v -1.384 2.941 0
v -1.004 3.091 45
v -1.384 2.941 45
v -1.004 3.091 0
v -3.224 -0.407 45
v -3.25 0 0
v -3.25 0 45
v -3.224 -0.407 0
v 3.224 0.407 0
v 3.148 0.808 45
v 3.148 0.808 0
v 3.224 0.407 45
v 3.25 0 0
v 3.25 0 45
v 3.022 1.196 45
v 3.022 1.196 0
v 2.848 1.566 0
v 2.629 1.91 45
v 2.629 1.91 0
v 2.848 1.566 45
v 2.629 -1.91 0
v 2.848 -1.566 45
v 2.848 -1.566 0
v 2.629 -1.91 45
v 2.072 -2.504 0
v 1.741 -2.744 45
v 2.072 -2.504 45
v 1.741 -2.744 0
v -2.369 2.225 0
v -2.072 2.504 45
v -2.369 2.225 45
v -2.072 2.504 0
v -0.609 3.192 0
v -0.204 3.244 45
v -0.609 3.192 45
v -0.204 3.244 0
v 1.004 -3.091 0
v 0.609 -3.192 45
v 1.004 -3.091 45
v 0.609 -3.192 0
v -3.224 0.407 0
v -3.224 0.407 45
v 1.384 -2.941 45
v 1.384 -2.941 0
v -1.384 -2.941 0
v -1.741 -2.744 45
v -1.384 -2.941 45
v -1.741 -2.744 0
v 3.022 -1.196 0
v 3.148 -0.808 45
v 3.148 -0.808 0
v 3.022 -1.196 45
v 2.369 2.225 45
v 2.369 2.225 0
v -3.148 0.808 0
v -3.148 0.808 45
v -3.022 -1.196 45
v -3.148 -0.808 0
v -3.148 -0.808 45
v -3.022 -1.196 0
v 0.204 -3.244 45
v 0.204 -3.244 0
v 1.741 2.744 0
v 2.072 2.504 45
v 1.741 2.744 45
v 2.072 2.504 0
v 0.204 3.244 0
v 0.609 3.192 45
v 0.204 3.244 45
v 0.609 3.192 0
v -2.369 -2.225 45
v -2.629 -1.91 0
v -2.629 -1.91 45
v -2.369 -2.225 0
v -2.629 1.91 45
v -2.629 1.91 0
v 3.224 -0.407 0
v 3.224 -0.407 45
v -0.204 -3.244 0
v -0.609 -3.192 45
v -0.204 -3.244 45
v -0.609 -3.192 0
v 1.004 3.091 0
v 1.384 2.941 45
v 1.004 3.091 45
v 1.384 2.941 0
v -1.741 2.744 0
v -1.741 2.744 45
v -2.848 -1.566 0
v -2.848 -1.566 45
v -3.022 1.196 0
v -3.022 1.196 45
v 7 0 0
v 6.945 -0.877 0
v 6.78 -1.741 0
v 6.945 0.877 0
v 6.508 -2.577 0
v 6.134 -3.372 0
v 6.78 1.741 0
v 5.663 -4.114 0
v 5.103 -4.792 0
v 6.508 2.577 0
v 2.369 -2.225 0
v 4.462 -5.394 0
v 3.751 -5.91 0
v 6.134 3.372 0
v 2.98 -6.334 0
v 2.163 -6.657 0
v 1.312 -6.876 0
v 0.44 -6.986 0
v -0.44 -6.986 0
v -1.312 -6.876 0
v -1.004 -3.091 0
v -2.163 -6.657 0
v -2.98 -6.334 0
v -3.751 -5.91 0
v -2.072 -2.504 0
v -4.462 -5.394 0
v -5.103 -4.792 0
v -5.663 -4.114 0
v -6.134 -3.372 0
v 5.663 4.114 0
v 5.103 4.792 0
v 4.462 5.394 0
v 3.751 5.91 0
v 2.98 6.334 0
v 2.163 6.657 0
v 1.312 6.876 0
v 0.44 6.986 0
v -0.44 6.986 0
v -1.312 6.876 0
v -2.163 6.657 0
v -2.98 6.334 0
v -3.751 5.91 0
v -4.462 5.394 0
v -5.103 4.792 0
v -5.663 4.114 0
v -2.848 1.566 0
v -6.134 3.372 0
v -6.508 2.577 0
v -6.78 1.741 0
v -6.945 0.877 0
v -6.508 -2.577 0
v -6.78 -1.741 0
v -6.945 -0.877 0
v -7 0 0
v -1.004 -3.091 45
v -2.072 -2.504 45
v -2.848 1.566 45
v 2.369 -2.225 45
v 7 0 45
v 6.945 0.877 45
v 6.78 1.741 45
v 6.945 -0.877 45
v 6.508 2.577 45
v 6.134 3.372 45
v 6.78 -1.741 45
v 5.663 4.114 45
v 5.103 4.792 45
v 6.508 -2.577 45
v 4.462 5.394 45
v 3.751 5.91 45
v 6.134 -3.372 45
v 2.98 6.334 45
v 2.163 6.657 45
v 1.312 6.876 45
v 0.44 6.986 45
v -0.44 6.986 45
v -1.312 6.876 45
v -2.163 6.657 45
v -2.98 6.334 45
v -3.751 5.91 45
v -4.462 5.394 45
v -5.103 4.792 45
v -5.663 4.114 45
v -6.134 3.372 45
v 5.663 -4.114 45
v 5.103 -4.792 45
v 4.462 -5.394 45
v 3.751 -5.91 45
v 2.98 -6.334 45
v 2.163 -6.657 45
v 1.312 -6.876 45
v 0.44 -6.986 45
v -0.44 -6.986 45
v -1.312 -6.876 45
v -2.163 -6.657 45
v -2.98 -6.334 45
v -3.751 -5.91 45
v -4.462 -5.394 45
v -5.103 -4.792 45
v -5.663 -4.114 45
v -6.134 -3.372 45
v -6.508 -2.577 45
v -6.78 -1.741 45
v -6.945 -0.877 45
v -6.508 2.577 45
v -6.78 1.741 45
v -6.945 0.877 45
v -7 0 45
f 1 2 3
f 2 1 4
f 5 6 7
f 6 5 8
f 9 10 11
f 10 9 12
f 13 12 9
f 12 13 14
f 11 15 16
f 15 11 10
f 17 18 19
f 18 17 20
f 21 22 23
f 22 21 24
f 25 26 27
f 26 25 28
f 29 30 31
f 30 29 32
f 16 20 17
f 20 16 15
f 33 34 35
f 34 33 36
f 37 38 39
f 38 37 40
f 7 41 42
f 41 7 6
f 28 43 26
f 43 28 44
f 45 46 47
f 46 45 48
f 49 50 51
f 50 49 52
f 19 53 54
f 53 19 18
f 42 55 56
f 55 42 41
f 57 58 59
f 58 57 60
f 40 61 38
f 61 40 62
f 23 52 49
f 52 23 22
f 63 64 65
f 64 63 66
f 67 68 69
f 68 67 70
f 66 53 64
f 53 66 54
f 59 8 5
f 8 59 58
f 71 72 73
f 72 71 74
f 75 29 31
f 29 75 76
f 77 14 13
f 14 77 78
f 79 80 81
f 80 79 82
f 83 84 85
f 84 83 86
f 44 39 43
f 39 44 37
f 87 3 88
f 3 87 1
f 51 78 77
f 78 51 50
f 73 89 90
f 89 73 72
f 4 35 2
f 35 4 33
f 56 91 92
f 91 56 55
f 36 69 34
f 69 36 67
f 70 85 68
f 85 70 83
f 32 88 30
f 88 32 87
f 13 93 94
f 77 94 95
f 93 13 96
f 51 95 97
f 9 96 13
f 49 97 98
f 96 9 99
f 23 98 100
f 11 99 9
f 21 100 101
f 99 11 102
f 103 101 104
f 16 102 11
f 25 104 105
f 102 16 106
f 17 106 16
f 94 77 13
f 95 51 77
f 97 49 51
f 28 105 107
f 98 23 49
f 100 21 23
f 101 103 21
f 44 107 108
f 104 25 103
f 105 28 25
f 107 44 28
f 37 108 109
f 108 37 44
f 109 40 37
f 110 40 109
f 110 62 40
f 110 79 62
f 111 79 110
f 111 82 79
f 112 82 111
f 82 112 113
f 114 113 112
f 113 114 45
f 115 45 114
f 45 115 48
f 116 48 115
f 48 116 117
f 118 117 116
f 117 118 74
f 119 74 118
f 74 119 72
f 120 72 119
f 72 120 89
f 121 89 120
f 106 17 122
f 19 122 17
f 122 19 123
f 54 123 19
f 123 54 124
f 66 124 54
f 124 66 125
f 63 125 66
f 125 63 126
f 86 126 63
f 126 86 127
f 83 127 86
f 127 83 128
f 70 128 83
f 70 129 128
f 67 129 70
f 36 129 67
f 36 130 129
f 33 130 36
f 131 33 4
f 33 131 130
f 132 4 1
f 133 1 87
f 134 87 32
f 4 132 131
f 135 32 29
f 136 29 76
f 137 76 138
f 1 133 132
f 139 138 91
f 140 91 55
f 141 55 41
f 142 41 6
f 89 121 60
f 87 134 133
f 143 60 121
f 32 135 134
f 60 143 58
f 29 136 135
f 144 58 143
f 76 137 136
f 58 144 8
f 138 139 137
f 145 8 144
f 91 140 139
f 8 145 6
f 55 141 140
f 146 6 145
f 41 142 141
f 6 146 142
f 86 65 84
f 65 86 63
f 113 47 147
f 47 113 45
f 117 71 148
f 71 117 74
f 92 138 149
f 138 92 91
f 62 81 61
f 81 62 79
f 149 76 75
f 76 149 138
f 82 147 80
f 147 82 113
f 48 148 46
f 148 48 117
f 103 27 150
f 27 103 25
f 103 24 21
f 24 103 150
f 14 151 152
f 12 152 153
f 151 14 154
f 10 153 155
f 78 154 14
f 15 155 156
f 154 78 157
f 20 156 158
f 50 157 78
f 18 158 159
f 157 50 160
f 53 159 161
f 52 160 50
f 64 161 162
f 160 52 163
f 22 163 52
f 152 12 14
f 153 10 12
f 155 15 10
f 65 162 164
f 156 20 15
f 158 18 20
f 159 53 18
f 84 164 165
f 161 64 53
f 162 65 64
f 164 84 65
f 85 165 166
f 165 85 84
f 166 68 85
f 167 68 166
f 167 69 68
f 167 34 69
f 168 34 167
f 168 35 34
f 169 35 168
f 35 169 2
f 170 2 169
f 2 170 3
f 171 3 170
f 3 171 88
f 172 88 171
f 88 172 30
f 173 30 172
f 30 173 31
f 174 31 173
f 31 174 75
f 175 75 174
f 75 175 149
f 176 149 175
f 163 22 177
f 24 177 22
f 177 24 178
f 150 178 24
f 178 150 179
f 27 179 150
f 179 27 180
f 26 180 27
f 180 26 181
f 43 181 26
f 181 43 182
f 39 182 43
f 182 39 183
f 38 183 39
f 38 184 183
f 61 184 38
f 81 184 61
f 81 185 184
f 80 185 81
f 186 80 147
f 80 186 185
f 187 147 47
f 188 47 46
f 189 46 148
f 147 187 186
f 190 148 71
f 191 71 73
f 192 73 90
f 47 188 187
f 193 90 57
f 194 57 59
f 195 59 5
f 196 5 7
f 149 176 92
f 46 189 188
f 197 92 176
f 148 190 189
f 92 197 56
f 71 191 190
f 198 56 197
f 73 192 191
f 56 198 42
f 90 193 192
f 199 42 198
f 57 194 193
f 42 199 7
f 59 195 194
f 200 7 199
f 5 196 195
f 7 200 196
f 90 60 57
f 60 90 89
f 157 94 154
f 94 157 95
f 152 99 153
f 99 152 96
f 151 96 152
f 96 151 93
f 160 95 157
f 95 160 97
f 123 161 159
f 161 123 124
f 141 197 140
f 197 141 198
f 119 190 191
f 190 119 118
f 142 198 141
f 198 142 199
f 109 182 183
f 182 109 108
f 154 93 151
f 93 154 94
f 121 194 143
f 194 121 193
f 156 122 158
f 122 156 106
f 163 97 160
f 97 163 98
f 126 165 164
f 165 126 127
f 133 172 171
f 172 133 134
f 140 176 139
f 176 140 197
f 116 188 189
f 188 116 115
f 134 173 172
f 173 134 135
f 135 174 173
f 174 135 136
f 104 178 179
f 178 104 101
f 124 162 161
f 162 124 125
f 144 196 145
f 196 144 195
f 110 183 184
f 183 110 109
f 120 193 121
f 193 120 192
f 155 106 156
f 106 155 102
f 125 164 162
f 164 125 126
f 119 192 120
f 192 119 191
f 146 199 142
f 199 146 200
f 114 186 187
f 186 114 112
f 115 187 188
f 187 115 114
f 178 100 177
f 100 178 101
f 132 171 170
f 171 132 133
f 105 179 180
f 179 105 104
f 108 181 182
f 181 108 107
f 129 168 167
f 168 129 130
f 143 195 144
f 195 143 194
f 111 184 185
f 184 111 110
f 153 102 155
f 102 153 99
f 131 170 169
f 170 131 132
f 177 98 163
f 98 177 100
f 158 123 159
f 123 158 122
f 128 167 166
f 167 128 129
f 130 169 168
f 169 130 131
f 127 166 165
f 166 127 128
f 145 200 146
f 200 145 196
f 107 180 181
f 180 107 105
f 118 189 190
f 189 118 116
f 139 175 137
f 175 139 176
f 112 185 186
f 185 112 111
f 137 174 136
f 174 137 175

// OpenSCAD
$fn = 50;


difference() {
	union() {
		cylinder(h = 45, r = 7.0000000000);
	}
	union() {
		cylinder(h = 45, r = 3.2500000000);
		cylinder(h = 45, r = 3.2500000000);
		cylinder(h = 45, r = 1.8000000000);
		cylinder(h = 45, r = 1.8000000000);
		cylinder(h = 45, r = 1.8000000000);
		cylinder(h = 45, r = 1.8000000000);
		cylinder(h = 45, r = 1.8000000000);
		cylinder(h = 45, r = 1.8000000000);
	}
}
